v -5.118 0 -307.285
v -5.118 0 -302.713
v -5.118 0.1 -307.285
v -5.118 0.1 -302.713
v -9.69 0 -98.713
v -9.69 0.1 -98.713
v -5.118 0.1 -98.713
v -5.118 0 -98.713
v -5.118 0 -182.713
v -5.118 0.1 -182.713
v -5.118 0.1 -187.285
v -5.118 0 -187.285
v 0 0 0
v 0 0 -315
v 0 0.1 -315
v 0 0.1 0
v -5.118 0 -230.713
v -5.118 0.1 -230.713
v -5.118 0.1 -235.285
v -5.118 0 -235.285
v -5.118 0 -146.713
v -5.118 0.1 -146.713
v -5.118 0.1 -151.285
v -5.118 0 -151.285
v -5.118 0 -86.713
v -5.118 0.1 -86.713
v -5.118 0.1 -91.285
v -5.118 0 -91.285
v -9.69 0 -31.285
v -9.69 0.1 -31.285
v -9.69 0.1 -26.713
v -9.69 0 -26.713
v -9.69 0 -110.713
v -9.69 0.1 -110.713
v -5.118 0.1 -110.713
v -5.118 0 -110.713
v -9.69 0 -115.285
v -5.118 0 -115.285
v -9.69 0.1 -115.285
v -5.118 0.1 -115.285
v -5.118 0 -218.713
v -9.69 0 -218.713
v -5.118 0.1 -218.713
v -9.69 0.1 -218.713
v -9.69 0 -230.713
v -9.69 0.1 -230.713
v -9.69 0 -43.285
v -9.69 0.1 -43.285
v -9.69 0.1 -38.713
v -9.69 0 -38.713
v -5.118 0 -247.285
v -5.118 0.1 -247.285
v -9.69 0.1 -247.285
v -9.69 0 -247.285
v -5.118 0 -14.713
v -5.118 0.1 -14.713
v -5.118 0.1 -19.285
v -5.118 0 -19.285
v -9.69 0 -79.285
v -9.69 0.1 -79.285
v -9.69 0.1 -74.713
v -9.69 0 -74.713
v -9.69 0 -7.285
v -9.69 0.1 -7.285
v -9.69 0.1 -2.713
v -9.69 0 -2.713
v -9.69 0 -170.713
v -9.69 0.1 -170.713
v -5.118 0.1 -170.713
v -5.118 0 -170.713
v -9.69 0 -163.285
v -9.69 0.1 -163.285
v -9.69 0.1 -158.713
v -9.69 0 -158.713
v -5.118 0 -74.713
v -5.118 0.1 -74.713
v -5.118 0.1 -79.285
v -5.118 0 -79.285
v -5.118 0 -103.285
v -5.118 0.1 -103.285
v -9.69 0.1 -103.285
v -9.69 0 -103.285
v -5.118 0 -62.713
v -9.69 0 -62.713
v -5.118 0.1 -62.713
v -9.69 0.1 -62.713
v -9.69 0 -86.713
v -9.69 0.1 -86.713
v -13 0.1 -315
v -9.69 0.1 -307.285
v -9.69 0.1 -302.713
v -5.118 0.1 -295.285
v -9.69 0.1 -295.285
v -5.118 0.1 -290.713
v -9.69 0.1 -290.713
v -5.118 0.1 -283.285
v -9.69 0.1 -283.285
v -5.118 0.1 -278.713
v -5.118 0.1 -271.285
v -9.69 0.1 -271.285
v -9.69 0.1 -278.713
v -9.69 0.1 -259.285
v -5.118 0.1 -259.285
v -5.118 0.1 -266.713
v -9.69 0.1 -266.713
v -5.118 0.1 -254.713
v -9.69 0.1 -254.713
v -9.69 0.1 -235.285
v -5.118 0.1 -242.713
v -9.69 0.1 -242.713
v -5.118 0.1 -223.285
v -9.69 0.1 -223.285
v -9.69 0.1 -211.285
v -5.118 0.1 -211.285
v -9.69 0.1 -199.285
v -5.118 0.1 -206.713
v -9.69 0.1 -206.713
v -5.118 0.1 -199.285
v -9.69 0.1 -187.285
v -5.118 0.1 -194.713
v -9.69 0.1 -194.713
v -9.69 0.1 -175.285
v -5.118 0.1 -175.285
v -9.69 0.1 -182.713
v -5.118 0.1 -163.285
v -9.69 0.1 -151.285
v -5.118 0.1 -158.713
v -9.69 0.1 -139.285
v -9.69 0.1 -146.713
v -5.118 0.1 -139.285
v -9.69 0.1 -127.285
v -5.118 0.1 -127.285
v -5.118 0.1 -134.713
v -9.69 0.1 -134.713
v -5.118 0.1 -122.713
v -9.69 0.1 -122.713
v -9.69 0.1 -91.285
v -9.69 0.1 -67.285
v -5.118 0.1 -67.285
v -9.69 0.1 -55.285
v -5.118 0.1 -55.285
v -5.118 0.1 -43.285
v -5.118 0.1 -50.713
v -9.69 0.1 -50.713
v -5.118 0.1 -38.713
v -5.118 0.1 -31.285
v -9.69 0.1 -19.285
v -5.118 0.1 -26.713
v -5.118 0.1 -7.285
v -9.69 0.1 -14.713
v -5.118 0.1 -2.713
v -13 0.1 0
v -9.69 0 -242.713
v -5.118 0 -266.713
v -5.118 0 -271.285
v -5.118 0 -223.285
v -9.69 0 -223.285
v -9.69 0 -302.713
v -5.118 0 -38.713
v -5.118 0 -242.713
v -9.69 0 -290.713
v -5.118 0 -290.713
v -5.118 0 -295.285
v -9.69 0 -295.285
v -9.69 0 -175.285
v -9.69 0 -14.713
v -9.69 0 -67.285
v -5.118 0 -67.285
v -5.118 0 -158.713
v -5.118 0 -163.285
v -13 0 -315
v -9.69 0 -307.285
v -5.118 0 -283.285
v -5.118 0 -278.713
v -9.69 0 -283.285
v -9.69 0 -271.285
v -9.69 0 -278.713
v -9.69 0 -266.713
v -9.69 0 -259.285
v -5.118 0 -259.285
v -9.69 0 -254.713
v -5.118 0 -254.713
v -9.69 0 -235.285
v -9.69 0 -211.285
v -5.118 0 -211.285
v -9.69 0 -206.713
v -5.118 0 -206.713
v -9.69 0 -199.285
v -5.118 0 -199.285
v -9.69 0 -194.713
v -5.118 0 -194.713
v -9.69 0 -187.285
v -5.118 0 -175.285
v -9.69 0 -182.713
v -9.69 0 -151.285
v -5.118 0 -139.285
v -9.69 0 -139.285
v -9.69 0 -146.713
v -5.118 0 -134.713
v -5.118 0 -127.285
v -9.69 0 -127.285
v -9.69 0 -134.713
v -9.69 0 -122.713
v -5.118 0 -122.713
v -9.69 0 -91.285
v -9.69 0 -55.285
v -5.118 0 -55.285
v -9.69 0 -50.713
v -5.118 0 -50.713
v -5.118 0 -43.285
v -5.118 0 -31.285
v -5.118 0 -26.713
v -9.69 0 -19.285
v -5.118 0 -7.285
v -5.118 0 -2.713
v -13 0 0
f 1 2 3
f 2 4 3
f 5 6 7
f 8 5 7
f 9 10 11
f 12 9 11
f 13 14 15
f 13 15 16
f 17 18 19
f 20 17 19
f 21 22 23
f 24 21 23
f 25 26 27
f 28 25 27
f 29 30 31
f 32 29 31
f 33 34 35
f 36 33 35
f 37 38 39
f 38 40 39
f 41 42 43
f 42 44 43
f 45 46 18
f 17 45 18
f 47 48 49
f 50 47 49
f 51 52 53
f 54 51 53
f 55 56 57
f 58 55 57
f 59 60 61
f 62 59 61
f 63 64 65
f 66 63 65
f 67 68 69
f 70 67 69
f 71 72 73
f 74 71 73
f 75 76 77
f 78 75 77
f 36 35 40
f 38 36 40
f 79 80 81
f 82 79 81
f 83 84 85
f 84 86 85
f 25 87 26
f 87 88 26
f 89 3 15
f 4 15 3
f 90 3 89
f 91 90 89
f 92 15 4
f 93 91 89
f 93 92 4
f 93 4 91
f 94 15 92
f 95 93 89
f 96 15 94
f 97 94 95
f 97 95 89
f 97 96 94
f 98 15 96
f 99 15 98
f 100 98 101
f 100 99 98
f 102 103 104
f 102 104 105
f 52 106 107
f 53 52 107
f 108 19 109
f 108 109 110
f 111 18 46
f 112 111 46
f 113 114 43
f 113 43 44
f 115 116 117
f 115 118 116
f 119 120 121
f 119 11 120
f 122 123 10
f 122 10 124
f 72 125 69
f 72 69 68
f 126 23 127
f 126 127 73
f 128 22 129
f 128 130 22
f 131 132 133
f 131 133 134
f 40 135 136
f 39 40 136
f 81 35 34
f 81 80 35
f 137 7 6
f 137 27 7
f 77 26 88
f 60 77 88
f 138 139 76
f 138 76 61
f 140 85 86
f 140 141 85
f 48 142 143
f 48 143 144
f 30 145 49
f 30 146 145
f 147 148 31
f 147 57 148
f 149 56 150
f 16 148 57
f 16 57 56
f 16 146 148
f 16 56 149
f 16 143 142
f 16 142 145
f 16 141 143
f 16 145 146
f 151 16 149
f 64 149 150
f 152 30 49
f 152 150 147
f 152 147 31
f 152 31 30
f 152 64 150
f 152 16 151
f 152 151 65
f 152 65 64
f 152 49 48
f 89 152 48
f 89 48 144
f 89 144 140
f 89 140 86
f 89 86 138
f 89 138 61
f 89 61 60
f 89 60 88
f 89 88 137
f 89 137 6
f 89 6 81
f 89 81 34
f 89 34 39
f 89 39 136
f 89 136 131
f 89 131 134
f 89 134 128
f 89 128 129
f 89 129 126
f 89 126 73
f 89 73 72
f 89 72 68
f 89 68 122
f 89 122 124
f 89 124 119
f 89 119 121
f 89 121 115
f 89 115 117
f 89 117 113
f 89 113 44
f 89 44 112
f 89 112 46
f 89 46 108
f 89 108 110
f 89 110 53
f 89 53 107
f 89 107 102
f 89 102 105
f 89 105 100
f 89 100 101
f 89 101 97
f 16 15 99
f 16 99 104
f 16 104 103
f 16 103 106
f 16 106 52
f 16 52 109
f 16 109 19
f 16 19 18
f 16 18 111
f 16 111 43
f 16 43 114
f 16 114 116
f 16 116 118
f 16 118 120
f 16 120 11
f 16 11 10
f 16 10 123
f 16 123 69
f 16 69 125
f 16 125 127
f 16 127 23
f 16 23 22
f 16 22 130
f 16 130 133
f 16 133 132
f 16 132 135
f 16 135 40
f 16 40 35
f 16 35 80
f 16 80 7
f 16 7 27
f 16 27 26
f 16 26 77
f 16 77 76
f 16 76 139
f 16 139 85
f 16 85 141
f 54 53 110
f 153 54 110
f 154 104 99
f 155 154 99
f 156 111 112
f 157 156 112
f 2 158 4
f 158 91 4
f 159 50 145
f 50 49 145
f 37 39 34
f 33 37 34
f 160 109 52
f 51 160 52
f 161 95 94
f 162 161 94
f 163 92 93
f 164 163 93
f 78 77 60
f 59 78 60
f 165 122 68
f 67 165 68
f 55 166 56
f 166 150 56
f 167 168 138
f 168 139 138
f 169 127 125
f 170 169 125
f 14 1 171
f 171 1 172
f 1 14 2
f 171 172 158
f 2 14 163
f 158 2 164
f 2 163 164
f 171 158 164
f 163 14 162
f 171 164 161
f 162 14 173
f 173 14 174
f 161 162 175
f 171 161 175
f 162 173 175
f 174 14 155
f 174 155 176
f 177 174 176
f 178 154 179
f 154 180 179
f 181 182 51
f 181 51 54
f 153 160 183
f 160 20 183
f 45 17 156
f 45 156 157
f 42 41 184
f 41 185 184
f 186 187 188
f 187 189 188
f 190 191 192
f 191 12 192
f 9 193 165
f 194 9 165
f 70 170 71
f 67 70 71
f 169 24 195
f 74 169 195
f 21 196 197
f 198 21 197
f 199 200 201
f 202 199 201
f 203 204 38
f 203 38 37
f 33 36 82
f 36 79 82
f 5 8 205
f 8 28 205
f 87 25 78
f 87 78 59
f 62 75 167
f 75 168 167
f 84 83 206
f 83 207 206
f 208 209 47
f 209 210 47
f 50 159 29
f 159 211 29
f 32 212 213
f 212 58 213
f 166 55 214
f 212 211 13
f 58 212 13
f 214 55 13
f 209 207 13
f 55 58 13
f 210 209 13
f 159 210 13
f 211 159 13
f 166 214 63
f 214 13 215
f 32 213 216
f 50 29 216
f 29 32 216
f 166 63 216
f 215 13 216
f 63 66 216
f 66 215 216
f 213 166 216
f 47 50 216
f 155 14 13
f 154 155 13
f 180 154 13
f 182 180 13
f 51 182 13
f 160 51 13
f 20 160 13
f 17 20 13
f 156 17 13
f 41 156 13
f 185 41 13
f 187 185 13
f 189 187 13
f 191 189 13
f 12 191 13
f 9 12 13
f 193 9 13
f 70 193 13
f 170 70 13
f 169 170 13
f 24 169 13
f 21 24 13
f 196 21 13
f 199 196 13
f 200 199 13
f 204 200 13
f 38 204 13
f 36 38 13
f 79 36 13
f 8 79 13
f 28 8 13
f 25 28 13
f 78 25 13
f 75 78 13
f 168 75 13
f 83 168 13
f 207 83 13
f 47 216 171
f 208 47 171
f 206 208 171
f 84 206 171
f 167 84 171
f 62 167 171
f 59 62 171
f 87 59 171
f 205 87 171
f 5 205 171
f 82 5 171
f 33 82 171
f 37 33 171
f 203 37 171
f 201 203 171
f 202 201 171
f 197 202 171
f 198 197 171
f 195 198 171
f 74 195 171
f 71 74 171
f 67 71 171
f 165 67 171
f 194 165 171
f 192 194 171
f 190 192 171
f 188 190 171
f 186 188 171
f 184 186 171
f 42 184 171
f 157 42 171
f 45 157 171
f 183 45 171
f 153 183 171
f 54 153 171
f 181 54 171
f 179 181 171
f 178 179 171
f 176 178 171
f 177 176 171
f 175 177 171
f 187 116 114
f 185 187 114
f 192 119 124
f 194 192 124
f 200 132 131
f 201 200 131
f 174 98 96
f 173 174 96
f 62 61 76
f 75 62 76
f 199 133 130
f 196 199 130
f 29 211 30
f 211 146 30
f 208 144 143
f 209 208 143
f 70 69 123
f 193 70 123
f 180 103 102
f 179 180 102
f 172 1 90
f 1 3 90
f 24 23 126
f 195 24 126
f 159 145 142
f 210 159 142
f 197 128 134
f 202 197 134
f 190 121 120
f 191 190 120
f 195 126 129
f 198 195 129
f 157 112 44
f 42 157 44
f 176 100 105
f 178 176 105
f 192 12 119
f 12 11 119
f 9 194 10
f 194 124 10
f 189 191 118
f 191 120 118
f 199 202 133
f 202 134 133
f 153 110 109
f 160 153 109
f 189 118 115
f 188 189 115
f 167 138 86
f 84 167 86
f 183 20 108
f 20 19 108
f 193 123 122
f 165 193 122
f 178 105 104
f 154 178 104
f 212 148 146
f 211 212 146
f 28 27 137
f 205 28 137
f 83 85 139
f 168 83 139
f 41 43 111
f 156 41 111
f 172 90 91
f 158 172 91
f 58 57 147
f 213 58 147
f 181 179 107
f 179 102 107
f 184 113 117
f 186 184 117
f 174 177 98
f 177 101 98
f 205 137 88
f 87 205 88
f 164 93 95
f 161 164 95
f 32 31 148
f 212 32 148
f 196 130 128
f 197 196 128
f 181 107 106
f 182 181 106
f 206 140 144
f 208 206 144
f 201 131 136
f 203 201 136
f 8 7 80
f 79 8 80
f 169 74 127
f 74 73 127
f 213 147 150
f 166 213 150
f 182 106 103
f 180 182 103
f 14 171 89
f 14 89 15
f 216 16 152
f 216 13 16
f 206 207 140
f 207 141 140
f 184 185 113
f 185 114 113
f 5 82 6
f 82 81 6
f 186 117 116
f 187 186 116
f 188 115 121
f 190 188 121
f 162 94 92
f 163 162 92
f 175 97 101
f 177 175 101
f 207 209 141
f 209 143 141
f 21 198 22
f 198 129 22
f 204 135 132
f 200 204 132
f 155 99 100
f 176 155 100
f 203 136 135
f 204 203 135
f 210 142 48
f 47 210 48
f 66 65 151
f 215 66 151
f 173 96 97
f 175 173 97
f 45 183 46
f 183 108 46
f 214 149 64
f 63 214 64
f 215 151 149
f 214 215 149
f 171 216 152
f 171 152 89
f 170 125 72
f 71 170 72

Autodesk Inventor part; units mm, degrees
ref_plane "YZ Plane" through (0, 0, 0) normal (1, 0, 0) x (0, 1, 0)
ref_plane "XZ Plane" through (0, 0, 0) normal (0, 1, 0) x (-1, 0, 0)
ref_plane "XY Plane" through (0, 0, 0) normal (0, 0, 1) x (1, 0, 0)
sketch "Sketch1" plane through (0, 0, 0) normal (0, 1, 0) x (-1, 0, 0)
  line L0 (0, 0) -> (13, 0)
  line L1 (13, 0) -> (13, -315)
  line L2 (13, -315) -> (0, -315)
  line L3 (0, -315) -> (0, 0)
  dimension "d0" = 13
  dimension "d1" = 315
extrude "Extrusion1" add sketch "Sketch1" along normal blind 0.1
sketch "Sketch2" plane through (0, 0.1, 0) normal (0, 1, 0) x (1, 0, 0)
  line L0 (-9.69, 2.7126) -> (-5.118, 2.7126)
  line L1 (-5.118, 2.7126) -> (-5.118, 7.2846)
  line L2 (-5.118, 7.2846) -> (-9.69, 7.2846)
  line L3 (-9.69, 7.2846) -> (-9.69, 2.7126)
  line L4 (-9.69, 14.7126) -> (-5.118, 14.7126)
  line L5 (-5.118, 14.7126) -> (-5.118, 19.2846)
  line L6 (-5.118, 19.2846) -> (-9.69, 19.2846)
  line L7 (-9.69, 19.2846) -> (-9.69, 14.7126)
  line L8 (-9.69, 26.7126) -> (-5.118, 26.7126)
  line L9 (-5.118, 26.7126) -> (-5.118, 31.2846)
  line L10 (-5.118, 31.2846) -> (-9.69, 31.2846)
  line L11 (-9.69, 31.2846) -> (-9.69, 26.7126)
  line L12 (-9.69, 38.7126) -> (-5.118, 38.7126)
  line L13 (-5.118, 38.7126) -> (-5.118, 43.2846)
  line L14 (-5.118, 43.2846) -> (-9.69, 43.2846)
  line L15 (-9.69, 43.2846) -> (-9.69, 38.7126)
  line L16 (-9.69, 50.7126) -> (-5.118, 50.7126)
  line L17 (-5.118, 50.7126) -> (-5.118, 55.2846)
  line L18 (-5.118, 55.2846) -> (-9.69, 55.2846)
  line L19 (-9.69, 55.2846) -> (-9.69, 50.7126)
  line L20 (-9.69, 62.7126) -> (-5.118, 62.7126)
  line L21 (-5.118, 62.7126) -> (-5.118, 67.2846)
  line L22 (-5.118, 67.2846) -> (-9.69, 67.2846)
  line L23 (-9.69, 67.2846) -> (-9.69, 62.7126)
  line L24 (-9.69, 74.7126) -> (-5.118, 74.7126)
  line L25 (-5.118, 74.7126) -> (-5.118, 79.2846)
  line L26 (-5.118, 79.2846) -> (-9.69, 79.2846)
  line L27 (-9.69, 79.2846) -> (-9.69, 74.7126)
  line L28 (-9.69, 86.7126) -> (-5.118, 86.7126)
  line L29 (-5.118, 86.7126) -> (-5.118, 91.2846)
  line L30 (-5.118, 91.2846) -> (-9.69, 91.2846)
  line L31 (-9.69, 91.2846) -> (-9.69, 86.7126)
  line L32 (-9.69, 98.7126) -> (-5.118, 98.7126)
  line L33 (-5.118, 98.7126) -> (-5.118, 103.2846)
  line L34 (-5.118, 103.2846) -> (-9.69, 103.2846)
  line L35 (-9.69, 103.2846) -> (-9.69, 98.7126)
  line L36 (-9.69, 110.7126) -> (-5.118, 110.7126)
  line L37 (-5.118, 110.7126) -> (-5.118, 115.2846)
  line L38 (-5.118, 115.2846) -> (-9.69, 115.2846)
  line L39 (-9.69, 115.2846) -> (-9.69, 110.7126)
  line L40 (-9.69, 122.7126) -> (-5.118, 122.7126)
  line L41 (-5.118, 122.7126) -> (-5.118, 127.2846)
  line L42 (-5.118, 127.2846) -> (-9.69, 127.2846)
  line L43 (-9.69, 127.2846) -> (-9.69, 122.7126)
  line L44 (-9.69, 134.7126) -> (-5.118, 134.7126)
  line L45 (-5.118, 134.7126) -> (-5.118, 139.2846)
  line L46 (-5.118, 139.2846) -> (-9.69, 139.2846)
  line L47 (-9.69, 139.2846) -> (-9.69, 134.7126)
  line L48 (-9.69, 146.7126) -> (-5.118, 146.7126)
  line L49 (-5.118, 146.7126) -> (-5.118, 151.2846)
  line L50 (-5.118, 151.2846) -> (-9.69, 151.2846)
  line L51 (-9.69, 151.2846) -> (-9.69, 146.7126)
  line L52 (-9.69, 158.7126) -> (-5.118, 158.7126)
  line L53 (-5.118, 158.7126) -> (-5.118, 163.2846)
  line L54 (-5.118, 163.2846) -> (-9.69, 163.2846)
  line L55 (-9.69, 163.2846) -> (-9.69, 158.7126)
  line L56 (-9.69, 170.7126) -> (-5.118, 170.7126)
  line L57 (-5.118, 170.7126) -> (-5.118, 175.2846)
  line L58 (-5.118, 175.2846) -> (-9.69, 175.2846)
  line L59 (-9.69, 175.2846) -> (-9.69, 170.7126)
  line L60 (-9.69, 182.7126) -> (-5.118, 182.7126)
  line L61 (-5.118, 182.7126) -> (-5.118, 187.2846)
  line L62 (-5.118, 187.2846) -> (-9.69, 187.2846)
  line L63 (-9.69, 187.2846) -> (-9.69, 182.7126)
  line L64 (-9.69, 194.7126) -> (-5.118, 194.7126)
  line L65 (-5.118, 194.7126) -> (-5.118, 199.2846)
  line L66 (-5.118, 199.2846) -> (-9.69, 199.2846)
  line L67 (-9.69, 199.2846) -> (-9.69, 194.7126)
  line L68 (-9.69, 206.7126) -> (-5.118, 206.7126)
  line L69 (-5.118, 206.7126) -> (-5.118, 211.2846)
  line L70 (-5.118, 211.2846) -> (-9.69, 211.2846)
  line L71 (-9.69, 211.2846) -> (-9.69, 206.7126)
  line L72 (-9.69, 218.7126) -> (-5.118, 218.7126)
  line L73 (-5.118, 218.7126) -> (-5.118, 223.2846)
  line L74 (-5.118, 223.2846) -> (-9.69, 223.2846)
  line L75 (-9.69, 223.2846) -> (-9.69, 218.7126)
  line L76 (-9.69, 230.7126) -> (-5.118, 230.7126)
  line L77 (-5.118, 230.7126) -> (-5.118, 235.2846)
  line L78 (-5.118, 235.2846) -> (-9.69, 235.2846)
  line L79 (-9.69, 235.2846) -> (-9.69, 230.7126)
  line L80 (-9.69, 242.7126) -> (-5.118, 242.7126)
  line L81 (-5.118, 242.7126) -> (-5.118, 247.2846)
  line L82 (-5.118, 247.2846) -> (-9.69, 247.2846)
  line L83 (-9.69, 247.2846) -> (-9.69, 242.7126)
  line L84 (-9.69, 254.7126) -> (-5.118, 254.7126)
  line L85 (-5.118, 254.7126) -> (-5.118, 259.2846)
  line L86 (-5.118, 259.2846) -> (-9.69, 259.2846)
  line L87 (-9.69, 259.2846) -> (-9.69, 254.7126)
  line L88 (-9.69, 266.7126) -> (-5.118, 266.7126)
  line L89 (-5.118, 266.7126) -> (-5.118, 271.2846)
  line L90 (-5.118, 271.2846) -> (-9.69, 271.2846)
  line L91 (-9.69, 271.2846) -> (-9.69, 266.7126)
  line L92 (-9.69, 278.7126) -> (-5.118, 278.7126)
  line L93 (-5.118, 278.7126) -> (-5.118, 283.2846)
  line L94 (-5.118, 283.2846) -> (-9.69, 283.2846)
  line L95 (-9.69, 283.2846) -> (-9.69, 278.7126)
  line L96 (-9.69, 290.7126) -> (-5.118, 290.7126)
  line L97 (-5.118, 290.7126) -> (-5.118, 295.2846)
  line L98 (-5.118, 295.2846) -> (-9.69, 295.2846)
  line L99 (-9.69, 295.2846) -> (-9.69, 290.7126)
  line L100 (-9.69, 302.7126) -> (-5.118, 302.7126)
  line L101 (-5.118, 302.7126) -> (-5.118, 307.2846)
  line L102 (-5.118, 307.2846) -> (-9.69, 307.2846)
  line L103 (-9.69, 307.2846) -> (-9.69, 302.7126)
  point P0 (0, 0)
  dimension "d4" = 4.572
  dimension "d5" = 4.572
  dimension "d8" = 12
extrude "Extrusion2" cut sketch "Sketch2" against normal blind 0.1
properties part number "1sqr metal plate"
